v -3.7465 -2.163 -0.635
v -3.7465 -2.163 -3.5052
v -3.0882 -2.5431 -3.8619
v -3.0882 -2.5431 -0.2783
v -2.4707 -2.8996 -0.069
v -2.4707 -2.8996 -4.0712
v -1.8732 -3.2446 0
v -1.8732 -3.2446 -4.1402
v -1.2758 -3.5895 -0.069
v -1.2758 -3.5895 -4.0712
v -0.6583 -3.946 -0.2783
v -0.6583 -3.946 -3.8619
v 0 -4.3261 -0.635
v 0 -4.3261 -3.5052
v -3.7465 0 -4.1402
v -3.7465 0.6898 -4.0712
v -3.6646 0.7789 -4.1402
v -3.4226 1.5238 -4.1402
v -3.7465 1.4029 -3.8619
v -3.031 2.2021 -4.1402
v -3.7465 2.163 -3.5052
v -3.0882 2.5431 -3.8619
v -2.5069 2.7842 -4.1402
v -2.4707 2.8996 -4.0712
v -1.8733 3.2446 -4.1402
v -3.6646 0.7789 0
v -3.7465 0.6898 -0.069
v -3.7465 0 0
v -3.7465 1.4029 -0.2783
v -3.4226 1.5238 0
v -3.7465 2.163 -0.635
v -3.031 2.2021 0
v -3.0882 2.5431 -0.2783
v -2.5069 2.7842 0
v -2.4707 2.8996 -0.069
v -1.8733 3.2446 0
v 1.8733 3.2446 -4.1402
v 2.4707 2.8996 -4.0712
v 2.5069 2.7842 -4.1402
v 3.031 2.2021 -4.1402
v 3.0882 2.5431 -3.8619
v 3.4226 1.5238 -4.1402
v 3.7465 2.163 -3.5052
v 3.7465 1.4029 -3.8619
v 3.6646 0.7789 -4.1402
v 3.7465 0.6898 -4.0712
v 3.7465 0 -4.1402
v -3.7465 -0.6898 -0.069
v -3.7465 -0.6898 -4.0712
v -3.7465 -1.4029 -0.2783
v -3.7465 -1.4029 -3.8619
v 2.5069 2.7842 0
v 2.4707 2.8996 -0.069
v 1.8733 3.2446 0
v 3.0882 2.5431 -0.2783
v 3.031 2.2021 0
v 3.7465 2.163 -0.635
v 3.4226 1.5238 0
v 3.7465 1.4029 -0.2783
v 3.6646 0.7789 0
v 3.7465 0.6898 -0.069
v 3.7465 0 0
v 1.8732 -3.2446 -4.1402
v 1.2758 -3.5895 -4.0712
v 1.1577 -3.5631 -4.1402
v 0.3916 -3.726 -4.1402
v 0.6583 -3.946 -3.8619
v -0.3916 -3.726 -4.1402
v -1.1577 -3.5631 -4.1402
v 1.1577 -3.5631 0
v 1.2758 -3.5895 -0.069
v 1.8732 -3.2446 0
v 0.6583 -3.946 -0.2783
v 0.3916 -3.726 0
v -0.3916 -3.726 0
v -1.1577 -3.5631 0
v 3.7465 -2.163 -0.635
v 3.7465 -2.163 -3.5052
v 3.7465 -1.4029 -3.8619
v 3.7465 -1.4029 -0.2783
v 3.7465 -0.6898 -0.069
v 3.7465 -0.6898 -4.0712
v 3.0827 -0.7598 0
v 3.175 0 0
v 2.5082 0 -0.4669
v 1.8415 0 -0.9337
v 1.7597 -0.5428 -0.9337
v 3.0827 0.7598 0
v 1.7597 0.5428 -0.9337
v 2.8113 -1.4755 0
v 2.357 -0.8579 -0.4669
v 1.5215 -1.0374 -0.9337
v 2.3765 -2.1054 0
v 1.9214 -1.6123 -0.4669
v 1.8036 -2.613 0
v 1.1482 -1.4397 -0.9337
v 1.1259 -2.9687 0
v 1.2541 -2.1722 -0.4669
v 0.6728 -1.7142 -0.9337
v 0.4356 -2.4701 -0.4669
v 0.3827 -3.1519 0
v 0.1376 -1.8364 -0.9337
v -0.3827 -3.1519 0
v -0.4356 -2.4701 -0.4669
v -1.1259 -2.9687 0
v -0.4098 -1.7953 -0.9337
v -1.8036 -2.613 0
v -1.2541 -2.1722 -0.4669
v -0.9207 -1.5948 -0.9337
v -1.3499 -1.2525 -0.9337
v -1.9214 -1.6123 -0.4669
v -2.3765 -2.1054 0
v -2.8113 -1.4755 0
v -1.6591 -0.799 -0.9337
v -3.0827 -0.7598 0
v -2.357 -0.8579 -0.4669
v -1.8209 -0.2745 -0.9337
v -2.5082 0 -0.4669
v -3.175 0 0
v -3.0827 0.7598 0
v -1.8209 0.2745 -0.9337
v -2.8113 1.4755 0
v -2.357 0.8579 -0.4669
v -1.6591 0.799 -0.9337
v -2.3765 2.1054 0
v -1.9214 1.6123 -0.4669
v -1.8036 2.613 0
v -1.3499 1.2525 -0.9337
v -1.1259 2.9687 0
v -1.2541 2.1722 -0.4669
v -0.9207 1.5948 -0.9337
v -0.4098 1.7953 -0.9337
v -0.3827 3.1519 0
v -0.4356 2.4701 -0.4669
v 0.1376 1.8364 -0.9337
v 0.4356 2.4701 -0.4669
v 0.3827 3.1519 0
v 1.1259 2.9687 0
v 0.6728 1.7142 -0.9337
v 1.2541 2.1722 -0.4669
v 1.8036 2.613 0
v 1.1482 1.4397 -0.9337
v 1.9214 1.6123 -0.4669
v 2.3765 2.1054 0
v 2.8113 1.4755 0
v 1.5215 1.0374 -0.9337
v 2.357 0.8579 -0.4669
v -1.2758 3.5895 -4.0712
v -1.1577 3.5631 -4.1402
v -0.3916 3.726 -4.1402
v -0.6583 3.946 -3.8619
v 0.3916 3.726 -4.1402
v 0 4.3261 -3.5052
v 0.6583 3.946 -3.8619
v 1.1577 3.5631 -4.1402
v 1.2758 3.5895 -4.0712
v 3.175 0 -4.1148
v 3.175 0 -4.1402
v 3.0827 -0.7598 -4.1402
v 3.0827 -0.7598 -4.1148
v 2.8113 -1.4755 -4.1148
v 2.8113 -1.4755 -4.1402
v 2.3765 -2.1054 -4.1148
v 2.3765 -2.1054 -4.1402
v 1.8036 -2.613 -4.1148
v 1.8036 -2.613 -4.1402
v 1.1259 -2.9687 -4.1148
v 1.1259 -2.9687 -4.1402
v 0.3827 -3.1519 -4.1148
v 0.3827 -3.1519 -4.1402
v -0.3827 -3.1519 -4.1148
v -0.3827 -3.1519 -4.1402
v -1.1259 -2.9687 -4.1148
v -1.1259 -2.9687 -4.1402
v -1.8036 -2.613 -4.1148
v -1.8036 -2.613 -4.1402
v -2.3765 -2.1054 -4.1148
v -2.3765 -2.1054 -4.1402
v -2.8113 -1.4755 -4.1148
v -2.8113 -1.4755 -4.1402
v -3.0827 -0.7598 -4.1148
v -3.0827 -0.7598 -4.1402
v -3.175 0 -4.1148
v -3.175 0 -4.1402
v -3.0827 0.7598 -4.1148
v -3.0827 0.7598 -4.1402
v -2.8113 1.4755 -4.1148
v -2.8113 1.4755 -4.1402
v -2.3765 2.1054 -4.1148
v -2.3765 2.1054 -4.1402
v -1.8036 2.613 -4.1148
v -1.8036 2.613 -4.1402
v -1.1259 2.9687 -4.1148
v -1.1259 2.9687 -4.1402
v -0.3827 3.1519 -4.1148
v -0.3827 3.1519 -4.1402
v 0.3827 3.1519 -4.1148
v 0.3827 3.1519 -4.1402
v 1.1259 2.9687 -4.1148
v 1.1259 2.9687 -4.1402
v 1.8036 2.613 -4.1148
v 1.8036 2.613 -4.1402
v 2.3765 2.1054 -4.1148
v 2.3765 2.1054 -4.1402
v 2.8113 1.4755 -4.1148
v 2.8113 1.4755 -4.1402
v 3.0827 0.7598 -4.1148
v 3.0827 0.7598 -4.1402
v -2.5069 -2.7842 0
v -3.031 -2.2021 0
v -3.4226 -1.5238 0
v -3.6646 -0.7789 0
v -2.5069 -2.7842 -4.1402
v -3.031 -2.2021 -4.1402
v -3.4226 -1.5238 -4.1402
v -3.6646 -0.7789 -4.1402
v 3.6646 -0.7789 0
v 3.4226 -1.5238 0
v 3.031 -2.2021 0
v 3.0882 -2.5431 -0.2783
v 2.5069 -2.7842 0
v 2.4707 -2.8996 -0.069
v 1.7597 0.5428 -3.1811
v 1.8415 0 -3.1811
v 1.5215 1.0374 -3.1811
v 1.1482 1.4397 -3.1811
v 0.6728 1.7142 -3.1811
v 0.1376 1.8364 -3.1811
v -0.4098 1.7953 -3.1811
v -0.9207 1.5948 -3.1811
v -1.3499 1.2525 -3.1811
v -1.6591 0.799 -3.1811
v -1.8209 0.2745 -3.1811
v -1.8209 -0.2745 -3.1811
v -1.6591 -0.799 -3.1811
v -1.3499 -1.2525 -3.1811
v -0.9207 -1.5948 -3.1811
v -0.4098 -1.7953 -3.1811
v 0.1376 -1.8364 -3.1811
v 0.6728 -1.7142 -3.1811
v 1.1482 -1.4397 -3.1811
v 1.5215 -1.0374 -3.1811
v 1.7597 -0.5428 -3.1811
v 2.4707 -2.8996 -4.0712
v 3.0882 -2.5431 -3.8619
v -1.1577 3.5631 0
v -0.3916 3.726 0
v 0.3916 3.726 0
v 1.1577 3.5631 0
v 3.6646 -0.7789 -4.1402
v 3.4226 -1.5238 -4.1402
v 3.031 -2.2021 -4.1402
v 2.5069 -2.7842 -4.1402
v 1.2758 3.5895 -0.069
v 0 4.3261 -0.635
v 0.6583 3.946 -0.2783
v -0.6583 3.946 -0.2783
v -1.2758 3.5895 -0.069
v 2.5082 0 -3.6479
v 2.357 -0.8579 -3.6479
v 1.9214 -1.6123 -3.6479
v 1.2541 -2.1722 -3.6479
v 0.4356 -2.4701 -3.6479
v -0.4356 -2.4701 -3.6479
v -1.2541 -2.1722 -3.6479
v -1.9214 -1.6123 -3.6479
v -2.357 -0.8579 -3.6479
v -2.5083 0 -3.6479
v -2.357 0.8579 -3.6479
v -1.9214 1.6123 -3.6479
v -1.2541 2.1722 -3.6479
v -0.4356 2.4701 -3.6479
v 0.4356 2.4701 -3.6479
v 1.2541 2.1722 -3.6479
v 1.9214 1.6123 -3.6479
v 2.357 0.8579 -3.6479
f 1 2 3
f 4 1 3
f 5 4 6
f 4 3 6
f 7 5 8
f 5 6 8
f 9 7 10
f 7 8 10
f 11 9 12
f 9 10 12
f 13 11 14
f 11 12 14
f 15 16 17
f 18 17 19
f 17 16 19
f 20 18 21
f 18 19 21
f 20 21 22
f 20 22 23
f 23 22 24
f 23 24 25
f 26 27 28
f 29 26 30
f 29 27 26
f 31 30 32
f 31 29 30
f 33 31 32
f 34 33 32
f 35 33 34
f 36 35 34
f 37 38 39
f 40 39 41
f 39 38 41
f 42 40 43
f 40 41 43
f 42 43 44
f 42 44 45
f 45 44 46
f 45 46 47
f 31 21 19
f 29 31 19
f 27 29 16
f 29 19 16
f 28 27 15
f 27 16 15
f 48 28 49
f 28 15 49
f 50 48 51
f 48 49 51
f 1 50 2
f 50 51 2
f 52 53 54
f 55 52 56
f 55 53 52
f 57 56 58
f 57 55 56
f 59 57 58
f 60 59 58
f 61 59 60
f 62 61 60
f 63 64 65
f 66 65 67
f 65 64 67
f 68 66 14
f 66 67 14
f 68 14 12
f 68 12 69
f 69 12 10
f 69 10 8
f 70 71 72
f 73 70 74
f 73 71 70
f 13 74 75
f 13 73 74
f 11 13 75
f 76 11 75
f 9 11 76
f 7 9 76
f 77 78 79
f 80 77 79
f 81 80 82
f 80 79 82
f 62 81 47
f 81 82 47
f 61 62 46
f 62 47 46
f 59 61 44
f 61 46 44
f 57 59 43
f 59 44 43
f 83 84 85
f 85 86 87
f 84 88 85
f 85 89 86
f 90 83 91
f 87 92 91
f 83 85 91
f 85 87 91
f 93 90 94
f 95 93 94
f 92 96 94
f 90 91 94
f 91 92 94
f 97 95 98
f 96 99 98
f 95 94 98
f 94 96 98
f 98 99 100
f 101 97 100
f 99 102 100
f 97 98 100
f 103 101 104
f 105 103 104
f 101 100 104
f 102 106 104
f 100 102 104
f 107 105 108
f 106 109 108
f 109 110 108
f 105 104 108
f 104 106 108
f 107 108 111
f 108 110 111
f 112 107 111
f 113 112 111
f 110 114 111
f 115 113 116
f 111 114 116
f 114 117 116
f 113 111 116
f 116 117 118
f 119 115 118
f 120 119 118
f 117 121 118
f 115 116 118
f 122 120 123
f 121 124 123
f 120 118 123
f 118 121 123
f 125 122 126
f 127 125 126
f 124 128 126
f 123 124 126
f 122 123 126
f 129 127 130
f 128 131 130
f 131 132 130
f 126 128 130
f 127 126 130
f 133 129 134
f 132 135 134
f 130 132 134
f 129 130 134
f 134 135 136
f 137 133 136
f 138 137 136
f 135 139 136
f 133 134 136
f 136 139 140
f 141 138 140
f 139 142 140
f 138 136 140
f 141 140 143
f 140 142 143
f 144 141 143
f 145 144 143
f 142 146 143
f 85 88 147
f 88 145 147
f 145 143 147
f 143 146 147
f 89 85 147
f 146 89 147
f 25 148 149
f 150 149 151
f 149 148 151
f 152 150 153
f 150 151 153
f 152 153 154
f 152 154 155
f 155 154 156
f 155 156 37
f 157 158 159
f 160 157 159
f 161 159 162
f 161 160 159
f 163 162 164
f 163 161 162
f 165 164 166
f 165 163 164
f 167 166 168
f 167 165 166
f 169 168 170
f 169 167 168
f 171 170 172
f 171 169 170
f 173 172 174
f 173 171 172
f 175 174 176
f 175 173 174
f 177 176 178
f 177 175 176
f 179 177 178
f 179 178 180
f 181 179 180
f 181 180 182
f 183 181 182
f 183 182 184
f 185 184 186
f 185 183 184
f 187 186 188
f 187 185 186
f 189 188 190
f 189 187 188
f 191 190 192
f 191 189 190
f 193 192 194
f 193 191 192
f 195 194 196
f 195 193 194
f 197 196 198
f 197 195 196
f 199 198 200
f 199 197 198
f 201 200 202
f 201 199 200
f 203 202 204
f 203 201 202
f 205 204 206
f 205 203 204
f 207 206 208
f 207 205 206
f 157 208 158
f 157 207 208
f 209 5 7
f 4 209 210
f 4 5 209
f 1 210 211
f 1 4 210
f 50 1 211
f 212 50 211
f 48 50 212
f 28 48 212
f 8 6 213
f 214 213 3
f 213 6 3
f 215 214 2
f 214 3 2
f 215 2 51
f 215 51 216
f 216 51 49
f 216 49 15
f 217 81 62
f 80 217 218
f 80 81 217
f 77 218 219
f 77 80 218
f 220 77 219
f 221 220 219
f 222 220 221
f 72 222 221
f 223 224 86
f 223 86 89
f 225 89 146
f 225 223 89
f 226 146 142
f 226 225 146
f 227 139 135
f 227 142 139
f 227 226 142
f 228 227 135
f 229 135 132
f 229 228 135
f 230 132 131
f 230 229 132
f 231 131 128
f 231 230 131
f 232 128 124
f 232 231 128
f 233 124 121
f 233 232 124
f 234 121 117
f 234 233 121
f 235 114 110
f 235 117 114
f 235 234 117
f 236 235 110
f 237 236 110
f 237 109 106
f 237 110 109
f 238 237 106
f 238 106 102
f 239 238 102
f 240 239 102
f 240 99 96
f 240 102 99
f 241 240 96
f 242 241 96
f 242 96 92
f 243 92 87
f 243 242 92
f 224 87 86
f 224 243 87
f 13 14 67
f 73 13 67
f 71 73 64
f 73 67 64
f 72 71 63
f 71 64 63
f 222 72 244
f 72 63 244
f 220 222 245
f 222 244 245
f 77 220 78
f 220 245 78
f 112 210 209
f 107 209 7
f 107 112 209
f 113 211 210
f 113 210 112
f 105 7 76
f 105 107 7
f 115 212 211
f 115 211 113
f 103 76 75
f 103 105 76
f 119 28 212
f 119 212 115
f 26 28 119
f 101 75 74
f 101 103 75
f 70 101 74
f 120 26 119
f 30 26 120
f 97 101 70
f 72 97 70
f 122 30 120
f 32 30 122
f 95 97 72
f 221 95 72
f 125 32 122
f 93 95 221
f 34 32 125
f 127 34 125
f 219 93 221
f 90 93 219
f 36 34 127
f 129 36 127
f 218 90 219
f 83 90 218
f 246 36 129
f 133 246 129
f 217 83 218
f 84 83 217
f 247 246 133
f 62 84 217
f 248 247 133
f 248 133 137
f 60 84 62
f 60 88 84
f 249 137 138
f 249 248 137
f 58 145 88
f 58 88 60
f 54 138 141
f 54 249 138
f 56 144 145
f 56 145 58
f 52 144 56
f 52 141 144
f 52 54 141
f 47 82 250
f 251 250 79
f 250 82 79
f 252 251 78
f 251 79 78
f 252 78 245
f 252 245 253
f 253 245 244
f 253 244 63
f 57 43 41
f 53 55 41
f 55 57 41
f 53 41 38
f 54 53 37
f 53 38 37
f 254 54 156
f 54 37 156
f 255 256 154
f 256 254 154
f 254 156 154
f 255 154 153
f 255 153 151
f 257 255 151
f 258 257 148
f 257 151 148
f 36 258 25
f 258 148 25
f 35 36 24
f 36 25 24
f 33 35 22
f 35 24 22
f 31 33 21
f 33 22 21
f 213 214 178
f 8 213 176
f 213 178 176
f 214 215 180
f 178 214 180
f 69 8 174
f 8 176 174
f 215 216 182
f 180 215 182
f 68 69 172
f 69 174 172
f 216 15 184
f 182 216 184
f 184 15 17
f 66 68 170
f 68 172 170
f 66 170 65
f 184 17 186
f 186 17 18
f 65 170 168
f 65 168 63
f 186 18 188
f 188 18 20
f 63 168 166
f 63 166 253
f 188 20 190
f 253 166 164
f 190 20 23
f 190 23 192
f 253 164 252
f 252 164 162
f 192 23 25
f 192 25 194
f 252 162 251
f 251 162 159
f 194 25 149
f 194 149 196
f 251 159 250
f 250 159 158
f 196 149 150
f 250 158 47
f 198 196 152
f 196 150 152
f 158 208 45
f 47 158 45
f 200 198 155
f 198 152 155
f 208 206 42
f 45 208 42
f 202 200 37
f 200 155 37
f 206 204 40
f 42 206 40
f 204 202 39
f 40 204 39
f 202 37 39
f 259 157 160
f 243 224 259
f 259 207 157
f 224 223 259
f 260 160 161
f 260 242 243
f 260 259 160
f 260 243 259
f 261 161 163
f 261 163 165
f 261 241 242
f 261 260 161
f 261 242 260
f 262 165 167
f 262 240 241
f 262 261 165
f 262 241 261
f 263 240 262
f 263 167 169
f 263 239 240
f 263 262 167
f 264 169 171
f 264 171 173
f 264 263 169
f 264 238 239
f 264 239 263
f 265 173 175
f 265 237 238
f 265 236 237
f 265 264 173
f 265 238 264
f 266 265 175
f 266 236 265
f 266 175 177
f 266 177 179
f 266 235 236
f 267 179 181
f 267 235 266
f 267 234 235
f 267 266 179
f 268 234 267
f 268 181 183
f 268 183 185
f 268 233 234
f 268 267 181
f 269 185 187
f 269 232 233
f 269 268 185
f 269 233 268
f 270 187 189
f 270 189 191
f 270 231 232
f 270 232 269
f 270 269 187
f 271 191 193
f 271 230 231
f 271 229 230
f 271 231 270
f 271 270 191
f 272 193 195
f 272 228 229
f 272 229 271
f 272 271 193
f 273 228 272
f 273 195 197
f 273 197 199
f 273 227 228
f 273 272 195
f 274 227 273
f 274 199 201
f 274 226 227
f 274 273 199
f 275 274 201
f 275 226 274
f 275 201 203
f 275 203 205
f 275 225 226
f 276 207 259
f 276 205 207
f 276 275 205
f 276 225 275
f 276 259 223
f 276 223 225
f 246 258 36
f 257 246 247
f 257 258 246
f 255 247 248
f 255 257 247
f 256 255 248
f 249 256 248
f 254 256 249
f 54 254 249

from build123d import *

# Parameters (mm, degrees)
THREADSCHEMATIC_START     = -4.1402
THREADSCHEMATIC_OUTLINE_R = 1.8415
THREADSCHEMATIC_DEPTH     = 4.1402


# Read off the part's stored shape, not the designer's step: ThreadSchematic
with BuildPart() as part:
    # ThreadSchematic outline → ThreadSchematic (new body)
    with BuildSketch(Plane.XY.offset(THREADSCHEMATIC_START)):
        Polygon((3.7465, 2.163042784), (0, 4.326085567), (-3.7465, 2.163042784), (-3.7465, -2.163042784), (0, -4.326085567), (3.7465, -2.163042784), align=None)
        Circle(THREADSCHEMATIC_OUTLINE_R, mode=Mode.SUBTRACT)
    extrude(amount=THREADSCHEMATIC_DEPTH)

    # Sketch3 → Double-Chamfer (revolve, cut)
    with BuildSketch(Plane(origin=(0, 0, 0), x_dir=(0, 0, -1), z_dir=(1, 0, 0))):
        Polygon((4.1402, 3.7465), (3.5052, 4.326085567), (3.5052, 17.026085567), (16.8402, 17.026085567), (16.8402, 3.7465), align=None)
        Polygon((0.635, 17.026085567), (-12.7, 17.026085567), (-12.7, 3.7465), (0, 3.7465), (0.635, 4.326085567), align=None)
    revolve(axis=Axis((0, 0, 0), (0, 0, -1)), mode=Mode.SUBTRACT)

    # EndChamferSke → EndChamfer (revolve, cut)
    with BuildSketch(Plane(origin=(0, 0, 0), x_dir=(0, 0, -1), z_dir=(1, 0, 0)), mode=Mode.PRIVATE) as endchamfer_sk:
        Polygon((4.1148, 3.175), (3.087700573, 1.70815), (4.1656, 1.70815), (4.1656, 3.175), align=None)
        Polygon((-0.0508, 3.175), (0, 3.175), (1.027099427, 1.70815), (-0.0508, 1.70815), align=None)
    revolve(endchamfer_sk.sketch.rotate(Axis((0, 0, -25.037505729), (0, 0, -1)), 90), axis=Axis((0, 0, -25.037505729), (0, 0, -1)), mode=Mode.SUBTRACT)


solid = part.part
